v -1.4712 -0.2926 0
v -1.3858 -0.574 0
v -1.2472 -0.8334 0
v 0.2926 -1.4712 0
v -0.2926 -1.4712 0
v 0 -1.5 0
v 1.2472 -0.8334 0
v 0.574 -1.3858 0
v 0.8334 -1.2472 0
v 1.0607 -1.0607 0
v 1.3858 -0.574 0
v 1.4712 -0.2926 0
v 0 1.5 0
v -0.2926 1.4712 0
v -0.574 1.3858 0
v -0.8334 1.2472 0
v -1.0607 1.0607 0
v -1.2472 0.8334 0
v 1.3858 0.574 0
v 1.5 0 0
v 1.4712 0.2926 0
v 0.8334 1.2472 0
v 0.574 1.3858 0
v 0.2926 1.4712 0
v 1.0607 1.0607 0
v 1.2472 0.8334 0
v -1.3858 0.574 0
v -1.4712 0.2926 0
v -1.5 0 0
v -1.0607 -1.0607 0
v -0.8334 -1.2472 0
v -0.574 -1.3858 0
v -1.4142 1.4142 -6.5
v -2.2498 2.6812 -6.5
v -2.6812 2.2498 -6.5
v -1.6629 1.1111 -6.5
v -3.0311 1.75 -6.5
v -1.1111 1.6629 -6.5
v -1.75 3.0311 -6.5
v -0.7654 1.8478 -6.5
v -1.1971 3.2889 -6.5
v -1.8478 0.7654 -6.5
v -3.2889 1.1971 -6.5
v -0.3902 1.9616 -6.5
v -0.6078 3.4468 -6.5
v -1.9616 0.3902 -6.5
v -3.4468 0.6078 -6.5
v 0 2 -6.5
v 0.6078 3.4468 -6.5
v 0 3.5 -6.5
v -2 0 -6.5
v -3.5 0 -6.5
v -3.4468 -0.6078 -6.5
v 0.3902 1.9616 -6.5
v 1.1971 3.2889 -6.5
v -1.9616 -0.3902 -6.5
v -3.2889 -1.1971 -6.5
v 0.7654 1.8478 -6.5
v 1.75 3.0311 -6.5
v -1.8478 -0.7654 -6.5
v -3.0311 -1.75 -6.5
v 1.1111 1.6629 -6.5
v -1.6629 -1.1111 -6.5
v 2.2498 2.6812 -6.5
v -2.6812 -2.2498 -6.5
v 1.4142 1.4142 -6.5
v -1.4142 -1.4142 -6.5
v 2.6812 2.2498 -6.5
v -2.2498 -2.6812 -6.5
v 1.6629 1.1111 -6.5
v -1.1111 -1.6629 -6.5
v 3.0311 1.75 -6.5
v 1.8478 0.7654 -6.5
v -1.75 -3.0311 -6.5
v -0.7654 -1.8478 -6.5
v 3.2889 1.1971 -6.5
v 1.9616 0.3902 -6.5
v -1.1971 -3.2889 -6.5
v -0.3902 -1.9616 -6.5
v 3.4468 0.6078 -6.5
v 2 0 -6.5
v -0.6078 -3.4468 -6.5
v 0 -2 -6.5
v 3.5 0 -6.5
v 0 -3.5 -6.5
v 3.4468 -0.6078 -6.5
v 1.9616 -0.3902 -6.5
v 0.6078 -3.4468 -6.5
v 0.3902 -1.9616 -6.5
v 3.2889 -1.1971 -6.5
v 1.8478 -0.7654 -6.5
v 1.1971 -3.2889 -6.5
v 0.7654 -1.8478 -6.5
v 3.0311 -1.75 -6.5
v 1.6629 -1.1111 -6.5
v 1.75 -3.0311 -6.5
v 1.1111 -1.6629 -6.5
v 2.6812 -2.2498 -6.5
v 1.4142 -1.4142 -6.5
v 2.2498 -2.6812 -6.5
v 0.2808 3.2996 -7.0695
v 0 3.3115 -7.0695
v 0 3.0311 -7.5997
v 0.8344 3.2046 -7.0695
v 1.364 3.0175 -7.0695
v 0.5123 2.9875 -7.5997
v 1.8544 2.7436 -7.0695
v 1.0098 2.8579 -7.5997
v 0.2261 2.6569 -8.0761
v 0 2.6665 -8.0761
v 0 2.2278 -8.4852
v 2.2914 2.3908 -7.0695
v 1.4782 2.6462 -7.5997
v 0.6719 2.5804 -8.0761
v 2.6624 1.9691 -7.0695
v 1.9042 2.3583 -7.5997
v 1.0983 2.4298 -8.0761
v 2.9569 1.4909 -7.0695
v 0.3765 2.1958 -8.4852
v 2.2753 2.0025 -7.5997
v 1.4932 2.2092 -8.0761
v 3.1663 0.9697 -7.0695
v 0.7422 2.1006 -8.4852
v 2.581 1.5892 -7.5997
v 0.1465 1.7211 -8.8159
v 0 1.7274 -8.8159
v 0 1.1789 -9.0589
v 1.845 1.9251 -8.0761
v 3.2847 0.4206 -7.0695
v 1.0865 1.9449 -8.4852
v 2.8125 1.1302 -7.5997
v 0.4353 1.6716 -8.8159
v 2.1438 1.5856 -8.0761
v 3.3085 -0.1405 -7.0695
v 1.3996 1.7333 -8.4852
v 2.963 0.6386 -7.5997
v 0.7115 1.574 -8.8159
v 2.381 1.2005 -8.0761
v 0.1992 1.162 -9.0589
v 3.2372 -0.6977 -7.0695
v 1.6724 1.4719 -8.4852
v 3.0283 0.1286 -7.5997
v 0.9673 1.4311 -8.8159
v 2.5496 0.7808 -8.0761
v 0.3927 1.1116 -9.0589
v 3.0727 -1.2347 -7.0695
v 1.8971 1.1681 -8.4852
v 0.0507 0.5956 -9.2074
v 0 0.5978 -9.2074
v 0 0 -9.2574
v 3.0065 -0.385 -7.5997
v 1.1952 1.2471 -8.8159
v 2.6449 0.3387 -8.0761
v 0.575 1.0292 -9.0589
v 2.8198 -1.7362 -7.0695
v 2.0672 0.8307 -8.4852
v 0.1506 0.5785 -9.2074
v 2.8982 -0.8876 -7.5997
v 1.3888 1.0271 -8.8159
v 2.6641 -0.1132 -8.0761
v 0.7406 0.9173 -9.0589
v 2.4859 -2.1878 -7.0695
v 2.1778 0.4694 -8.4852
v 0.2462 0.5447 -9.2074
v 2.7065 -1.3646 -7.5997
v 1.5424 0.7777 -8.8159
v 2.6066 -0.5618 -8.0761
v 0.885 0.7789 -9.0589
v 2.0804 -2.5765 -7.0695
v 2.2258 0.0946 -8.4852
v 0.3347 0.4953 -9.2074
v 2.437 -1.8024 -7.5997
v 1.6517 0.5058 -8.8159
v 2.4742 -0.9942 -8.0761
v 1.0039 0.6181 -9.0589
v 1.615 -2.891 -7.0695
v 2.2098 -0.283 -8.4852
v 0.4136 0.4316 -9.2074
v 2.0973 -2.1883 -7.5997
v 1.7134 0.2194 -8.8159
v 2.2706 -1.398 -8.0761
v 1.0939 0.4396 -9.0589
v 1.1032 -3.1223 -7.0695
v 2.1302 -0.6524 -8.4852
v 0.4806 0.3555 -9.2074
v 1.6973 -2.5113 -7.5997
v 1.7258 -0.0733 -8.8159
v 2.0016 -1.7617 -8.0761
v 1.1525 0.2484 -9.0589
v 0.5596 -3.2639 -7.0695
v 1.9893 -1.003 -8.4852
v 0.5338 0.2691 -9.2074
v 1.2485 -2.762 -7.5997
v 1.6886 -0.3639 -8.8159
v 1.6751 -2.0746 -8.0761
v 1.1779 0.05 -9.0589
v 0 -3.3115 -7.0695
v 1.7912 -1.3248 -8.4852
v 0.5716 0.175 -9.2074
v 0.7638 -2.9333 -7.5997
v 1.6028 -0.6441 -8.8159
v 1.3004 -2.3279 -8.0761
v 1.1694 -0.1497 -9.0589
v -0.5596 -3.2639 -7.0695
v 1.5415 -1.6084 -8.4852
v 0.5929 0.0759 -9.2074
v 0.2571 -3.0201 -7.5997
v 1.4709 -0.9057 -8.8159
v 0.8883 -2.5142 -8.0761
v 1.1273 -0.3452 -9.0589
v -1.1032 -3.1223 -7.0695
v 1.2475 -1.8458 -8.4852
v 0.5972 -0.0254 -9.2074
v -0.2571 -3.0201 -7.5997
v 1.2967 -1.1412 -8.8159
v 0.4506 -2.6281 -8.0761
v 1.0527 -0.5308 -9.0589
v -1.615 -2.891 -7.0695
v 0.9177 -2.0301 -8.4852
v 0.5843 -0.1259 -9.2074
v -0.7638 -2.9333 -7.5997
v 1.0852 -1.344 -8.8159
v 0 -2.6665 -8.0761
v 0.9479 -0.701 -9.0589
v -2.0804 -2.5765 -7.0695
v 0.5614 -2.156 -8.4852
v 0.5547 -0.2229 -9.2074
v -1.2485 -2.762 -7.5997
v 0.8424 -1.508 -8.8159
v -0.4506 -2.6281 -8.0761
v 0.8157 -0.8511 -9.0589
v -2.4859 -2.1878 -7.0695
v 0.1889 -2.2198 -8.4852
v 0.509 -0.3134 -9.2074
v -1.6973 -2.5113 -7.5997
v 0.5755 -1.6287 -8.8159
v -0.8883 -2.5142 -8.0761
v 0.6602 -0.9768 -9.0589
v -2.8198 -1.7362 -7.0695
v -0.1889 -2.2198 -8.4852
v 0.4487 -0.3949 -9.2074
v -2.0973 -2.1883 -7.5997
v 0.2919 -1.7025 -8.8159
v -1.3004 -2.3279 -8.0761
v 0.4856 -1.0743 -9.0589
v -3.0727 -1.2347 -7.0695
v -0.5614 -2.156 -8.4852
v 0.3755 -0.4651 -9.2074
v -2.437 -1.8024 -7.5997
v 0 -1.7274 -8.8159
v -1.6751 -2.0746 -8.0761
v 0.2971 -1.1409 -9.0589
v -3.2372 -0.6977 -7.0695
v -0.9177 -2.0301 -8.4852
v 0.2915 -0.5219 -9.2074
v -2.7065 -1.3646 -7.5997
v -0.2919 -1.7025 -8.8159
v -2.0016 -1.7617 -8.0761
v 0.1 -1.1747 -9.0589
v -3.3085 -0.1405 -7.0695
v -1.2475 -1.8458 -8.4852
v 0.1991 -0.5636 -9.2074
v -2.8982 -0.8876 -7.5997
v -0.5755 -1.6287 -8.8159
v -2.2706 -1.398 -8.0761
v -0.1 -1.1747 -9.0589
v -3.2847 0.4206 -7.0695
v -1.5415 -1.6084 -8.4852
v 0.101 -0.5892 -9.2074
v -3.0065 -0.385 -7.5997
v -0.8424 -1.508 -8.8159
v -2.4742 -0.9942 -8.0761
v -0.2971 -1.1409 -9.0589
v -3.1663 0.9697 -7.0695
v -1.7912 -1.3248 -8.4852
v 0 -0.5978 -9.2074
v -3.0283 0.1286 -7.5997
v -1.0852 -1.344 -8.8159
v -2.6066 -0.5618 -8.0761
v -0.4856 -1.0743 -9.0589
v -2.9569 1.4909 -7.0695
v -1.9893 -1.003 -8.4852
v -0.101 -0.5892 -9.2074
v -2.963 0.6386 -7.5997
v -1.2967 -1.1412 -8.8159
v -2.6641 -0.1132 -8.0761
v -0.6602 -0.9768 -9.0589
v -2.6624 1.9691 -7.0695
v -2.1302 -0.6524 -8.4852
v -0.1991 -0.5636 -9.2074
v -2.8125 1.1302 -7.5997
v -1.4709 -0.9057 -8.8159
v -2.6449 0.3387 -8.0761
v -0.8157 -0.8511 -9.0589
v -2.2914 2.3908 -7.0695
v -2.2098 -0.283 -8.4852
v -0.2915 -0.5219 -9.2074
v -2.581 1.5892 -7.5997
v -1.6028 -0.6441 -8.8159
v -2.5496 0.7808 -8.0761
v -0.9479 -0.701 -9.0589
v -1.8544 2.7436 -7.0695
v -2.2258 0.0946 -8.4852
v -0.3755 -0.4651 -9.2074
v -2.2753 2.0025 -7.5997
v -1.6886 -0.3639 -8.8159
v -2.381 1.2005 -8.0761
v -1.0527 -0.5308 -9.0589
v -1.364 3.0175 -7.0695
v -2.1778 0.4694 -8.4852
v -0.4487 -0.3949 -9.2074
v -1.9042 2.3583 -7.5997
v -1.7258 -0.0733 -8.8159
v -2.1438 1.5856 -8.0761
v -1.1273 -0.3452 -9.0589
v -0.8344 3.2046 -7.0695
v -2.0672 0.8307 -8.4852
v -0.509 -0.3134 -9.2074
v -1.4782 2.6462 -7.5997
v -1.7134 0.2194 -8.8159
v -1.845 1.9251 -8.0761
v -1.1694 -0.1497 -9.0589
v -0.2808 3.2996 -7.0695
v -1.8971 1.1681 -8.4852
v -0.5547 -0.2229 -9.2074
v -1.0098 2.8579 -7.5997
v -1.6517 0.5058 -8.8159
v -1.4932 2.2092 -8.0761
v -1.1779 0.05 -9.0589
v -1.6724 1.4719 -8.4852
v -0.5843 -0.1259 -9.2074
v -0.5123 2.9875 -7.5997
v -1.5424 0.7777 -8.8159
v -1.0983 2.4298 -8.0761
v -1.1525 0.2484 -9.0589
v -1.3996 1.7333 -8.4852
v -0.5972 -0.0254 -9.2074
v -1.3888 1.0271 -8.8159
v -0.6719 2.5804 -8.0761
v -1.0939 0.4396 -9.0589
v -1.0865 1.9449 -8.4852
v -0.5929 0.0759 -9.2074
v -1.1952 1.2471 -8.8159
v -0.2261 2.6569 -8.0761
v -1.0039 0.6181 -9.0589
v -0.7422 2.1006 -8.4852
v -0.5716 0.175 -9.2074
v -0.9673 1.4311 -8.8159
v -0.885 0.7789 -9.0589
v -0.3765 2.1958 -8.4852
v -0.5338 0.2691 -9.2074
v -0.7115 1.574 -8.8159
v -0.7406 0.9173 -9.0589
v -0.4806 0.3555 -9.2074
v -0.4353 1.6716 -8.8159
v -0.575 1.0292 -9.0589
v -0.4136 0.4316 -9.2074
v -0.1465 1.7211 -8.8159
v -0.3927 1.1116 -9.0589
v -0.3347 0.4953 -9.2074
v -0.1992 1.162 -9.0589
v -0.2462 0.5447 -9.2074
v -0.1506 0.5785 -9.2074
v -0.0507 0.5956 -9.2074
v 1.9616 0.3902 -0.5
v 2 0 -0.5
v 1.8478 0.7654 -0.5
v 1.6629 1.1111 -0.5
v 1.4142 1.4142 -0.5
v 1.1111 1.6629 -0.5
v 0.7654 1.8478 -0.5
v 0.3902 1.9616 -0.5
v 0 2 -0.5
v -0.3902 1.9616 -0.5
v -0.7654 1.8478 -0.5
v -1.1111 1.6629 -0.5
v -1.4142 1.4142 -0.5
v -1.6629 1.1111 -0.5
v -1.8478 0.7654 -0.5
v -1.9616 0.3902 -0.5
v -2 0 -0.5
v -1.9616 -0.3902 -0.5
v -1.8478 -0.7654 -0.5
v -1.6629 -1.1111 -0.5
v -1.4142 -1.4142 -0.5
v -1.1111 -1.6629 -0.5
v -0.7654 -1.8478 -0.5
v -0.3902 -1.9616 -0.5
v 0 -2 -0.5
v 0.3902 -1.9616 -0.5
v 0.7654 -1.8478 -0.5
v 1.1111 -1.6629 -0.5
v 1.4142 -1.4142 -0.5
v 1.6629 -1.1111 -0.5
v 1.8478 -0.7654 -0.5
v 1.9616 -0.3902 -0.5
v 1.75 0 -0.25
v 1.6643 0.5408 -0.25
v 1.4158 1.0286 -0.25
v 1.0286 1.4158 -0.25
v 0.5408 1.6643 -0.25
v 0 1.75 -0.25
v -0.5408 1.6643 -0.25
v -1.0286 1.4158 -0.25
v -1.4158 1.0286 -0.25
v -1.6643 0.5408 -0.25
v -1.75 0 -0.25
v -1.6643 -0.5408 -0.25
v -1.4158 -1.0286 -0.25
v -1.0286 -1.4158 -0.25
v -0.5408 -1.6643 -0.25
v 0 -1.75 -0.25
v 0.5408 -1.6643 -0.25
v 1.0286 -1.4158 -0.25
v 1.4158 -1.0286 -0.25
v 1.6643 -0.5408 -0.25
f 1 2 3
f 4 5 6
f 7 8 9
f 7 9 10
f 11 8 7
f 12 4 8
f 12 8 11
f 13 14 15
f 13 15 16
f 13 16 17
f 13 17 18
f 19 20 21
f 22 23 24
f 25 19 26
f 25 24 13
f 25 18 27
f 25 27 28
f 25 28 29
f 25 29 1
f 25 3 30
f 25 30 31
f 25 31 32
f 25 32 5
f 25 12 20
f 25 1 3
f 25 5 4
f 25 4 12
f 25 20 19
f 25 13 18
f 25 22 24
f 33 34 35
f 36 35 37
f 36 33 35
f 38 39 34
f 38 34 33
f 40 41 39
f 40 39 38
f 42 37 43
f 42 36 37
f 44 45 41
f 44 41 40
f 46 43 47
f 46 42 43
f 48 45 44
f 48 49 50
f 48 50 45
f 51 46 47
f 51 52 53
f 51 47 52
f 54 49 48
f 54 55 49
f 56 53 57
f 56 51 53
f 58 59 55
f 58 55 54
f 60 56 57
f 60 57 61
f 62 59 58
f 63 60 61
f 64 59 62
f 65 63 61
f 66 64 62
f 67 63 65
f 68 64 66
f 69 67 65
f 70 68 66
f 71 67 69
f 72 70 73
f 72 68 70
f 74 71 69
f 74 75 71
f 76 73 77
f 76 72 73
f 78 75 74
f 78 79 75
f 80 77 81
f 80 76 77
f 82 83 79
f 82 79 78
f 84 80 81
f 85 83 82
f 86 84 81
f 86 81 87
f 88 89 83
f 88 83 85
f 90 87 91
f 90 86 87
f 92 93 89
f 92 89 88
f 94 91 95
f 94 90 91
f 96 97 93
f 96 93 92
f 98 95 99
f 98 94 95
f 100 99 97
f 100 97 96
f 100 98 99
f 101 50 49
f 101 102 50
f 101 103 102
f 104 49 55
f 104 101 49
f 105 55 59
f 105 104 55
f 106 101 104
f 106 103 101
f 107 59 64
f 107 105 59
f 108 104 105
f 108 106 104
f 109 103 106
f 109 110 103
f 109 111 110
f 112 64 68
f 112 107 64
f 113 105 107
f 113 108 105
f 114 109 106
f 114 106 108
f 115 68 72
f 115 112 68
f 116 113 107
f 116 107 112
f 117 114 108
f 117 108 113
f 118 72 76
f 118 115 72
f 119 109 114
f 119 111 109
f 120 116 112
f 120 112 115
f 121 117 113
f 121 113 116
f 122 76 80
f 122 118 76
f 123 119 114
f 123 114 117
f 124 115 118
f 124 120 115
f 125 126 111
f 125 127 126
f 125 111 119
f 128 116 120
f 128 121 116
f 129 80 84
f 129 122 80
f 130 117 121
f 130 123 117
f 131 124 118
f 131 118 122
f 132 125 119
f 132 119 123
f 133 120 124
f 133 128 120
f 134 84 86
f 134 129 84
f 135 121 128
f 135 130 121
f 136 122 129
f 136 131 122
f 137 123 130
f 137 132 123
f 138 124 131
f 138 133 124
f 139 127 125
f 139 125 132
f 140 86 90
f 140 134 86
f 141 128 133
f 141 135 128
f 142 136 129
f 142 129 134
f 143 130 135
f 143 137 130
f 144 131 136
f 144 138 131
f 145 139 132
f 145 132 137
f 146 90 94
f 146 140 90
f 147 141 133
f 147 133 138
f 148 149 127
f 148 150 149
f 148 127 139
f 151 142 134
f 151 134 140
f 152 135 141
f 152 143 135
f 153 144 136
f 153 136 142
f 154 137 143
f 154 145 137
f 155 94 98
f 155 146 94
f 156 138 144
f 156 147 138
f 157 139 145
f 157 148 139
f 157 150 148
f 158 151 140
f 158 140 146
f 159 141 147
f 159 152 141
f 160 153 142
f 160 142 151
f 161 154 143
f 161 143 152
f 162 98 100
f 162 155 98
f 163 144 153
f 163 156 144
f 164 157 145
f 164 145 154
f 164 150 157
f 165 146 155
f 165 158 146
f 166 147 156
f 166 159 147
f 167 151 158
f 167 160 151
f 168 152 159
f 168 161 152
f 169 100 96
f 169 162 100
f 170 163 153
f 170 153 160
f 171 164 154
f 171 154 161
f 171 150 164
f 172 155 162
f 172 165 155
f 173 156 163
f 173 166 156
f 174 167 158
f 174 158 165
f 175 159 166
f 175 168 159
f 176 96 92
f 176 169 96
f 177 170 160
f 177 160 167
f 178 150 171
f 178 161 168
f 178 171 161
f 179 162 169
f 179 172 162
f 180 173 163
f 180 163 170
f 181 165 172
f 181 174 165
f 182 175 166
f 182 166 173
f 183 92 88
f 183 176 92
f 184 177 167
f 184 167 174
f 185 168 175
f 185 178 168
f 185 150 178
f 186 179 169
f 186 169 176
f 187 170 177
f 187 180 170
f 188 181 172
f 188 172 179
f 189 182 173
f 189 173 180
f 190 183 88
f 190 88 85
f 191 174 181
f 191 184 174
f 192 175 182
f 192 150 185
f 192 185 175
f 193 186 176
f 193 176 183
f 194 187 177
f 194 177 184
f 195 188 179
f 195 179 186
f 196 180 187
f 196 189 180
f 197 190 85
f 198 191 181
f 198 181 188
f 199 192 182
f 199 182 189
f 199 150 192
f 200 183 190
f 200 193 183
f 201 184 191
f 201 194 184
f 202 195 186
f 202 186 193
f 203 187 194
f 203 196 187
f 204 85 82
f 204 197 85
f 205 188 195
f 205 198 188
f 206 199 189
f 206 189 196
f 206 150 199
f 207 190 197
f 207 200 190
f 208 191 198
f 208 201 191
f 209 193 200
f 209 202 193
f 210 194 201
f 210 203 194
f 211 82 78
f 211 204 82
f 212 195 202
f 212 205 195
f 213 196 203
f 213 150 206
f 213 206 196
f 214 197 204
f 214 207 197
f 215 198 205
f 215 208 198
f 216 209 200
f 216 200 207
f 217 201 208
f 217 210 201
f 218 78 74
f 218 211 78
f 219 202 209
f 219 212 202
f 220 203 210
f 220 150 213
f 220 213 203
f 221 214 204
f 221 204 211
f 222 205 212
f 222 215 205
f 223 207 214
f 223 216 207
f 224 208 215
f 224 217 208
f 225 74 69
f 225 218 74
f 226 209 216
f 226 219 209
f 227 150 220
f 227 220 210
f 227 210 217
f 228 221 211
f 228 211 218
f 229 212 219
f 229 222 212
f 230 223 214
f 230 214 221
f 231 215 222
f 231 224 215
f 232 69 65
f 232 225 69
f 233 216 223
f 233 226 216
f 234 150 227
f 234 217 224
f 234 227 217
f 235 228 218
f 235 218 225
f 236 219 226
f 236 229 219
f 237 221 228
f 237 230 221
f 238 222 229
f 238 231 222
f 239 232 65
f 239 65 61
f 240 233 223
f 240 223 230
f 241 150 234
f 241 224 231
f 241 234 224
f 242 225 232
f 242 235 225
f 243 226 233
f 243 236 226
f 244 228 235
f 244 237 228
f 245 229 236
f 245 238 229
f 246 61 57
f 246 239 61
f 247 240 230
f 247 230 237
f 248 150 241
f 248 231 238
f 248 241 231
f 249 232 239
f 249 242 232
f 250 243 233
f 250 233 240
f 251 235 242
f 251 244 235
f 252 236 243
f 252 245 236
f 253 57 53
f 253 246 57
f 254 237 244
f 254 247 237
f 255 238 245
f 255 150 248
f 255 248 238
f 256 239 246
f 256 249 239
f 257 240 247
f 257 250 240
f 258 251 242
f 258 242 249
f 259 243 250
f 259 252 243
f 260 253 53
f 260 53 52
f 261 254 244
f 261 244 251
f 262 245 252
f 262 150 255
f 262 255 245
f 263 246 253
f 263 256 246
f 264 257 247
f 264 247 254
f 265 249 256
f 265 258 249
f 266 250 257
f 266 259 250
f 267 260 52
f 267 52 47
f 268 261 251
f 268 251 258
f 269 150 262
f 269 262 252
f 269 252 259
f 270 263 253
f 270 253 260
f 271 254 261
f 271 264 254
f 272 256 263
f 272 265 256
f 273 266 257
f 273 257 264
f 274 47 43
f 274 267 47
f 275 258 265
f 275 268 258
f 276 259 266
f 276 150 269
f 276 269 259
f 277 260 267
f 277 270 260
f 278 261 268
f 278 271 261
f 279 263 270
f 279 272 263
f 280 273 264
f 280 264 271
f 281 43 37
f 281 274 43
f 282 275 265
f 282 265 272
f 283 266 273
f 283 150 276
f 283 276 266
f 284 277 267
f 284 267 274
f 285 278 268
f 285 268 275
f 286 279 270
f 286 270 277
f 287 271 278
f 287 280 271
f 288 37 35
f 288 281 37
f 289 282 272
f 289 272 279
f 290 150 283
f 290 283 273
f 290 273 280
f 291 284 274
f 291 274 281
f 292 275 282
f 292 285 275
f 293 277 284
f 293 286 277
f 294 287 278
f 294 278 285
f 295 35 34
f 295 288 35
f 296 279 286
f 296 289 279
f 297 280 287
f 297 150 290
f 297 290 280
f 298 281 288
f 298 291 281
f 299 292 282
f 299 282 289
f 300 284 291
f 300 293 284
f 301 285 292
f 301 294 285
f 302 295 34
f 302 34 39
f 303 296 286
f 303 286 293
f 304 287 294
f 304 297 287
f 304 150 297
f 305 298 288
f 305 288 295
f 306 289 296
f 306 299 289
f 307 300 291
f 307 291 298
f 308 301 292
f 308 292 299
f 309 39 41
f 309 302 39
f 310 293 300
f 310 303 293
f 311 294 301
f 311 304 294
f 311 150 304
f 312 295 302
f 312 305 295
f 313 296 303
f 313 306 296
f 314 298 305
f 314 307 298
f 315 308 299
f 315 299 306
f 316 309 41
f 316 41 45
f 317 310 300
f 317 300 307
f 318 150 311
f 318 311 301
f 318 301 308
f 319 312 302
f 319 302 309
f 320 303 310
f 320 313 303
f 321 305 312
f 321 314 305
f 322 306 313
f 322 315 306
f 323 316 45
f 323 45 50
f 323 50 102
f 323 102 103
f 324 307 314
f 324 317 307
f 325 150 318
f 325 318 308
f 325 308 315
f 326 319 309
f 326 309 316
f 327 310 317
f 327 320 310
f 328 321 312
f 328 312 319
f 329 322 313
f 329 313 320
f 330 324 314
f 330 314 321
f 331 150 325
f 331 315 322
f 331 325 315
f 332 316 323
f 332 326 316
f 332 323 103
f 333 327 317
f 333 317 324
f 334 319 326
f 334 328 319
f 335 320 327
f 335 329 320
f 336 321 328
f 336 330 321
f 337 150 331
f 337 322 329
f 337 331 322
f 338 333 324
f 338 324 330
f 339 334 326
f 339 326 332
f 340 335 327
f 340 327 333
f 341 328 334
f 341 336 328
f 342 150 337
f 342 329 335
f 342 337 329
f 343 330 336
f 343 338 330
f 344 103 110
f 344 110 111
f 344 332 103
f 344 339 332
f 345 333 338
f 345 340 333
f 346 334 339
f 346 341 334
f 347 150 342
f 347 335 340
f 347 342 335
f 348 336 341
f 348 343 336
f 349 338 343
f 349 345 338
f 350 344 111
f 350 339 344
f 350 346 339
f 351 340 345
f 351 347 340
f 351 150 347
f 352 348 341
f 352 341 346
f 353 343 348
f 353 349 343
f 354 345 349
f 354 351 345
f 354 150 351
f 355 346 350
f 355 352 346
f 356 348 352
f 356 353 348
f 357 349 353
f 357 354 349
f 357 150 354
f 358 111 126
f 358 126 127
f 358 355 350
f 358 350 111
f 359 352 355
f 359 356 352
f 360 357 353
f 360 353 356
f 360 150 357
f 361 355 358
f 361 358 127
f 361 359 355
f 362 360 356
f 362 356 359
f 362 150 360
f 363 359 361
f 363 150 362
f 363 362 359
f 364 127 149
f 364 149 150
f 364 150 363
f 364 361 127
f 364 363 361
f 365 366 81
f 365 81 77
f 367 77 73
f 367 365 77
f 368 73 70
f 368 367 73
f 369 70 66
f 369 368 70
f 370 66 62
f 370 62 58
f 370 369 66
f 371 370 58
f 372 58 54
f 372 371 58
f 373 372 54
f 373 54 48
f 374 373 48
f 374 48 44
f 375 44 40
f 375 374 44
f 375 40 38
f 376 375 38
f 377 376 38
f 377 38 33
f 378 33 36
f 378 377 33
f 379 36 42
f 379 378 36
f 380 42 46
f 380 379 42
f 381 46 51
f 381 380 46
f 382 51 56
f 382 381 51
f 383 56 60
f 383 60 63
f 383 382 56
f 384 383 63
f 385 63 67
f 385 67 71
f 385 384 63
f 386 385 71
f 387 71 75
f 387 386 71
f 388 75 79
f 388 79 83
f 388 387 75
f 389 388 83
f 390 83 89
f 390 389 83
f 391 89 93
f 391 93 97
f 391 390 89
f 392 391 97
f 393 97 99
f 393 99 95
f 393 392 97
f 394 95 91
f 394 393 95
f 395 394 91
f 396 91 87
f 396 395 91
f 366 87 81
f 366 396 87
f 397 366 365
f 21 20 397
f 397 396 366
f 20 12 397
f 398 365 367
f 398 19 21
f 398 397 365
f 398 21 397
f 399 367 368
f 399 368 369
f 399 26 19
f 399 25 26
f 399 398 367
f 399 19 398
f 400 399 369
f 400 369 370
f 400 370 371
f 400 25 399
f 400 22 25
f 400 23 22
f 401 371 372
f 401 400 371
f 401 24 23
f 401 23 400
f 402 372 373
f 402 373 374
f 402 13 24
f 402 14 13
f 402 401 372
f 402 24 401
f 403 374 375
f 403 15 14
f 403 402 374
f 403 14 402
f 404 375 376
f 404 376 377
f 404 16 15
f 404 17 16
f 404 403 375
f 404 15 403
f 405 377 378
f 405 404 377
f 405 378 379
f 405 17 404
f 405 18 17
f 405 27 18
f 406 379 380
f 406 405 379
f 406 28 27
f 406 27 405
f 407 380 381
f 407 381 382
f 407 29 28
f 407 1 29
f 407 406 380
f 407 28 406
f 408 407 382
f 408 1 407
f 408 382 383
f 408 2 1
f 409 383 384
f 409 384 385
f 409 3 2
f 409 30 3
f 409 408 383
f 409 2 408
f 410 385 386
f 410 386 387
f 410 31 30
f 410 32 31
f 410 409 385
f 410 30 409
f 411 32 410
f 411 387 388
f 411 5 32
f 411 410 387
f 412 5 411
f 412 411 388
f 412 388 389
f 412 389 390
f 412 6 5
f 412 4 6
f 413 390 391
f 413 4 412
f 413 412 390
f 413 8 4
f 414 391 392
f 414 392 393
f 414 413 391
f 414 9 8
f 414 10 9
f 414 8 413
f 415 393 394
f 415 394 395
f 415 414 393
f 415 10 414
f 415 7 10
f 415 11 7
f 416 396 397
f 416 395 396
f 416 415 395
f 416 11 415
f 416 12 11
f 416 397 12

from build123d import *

# Parameters (mm, degrees)
SKETCH1_R           = 2
BOSS_EXTRUDE1_DEPTH = 6.5
CHAMFER1_SIZE       = 0.5


with BuildPart() as part:
    # Sketch1 → Boss-Extrude1 (new body)
    with BuildSketch(Plane.XY):
        Circle(SKETCH1_R)
    extrude(amount=-BOSS_EXTRUDE1_DEPTH)

    # Chamfer1
    chamfer1_edges = [part.edges().sort_by_distance(p)[0] for p in [
        (-2, 0, 0),
    ]]
    chamfer(chamfer1_edges, length=CHAMFER1_SIZE)

    # Sketch2 → Revolve1 (revolve)
    with BuildSketch(Plane(origin=(0, 0, 0), x_dir=(0, 0, -1), z_dir=(1, 0, 0))):
        with BuildLine():
            Line((6.5, 0), (6.5, 3.5))
            ThreePointArc((6.5, 3.5), (8.485229955, 2.227844932), (9.257385023, 0))
            Line((9.257385023, 0), (6.5, 0))
        make_face()
    revolve(axis=Axis((0, 0, -3.742614977), (0, 0, -1)))


solid = part.part
